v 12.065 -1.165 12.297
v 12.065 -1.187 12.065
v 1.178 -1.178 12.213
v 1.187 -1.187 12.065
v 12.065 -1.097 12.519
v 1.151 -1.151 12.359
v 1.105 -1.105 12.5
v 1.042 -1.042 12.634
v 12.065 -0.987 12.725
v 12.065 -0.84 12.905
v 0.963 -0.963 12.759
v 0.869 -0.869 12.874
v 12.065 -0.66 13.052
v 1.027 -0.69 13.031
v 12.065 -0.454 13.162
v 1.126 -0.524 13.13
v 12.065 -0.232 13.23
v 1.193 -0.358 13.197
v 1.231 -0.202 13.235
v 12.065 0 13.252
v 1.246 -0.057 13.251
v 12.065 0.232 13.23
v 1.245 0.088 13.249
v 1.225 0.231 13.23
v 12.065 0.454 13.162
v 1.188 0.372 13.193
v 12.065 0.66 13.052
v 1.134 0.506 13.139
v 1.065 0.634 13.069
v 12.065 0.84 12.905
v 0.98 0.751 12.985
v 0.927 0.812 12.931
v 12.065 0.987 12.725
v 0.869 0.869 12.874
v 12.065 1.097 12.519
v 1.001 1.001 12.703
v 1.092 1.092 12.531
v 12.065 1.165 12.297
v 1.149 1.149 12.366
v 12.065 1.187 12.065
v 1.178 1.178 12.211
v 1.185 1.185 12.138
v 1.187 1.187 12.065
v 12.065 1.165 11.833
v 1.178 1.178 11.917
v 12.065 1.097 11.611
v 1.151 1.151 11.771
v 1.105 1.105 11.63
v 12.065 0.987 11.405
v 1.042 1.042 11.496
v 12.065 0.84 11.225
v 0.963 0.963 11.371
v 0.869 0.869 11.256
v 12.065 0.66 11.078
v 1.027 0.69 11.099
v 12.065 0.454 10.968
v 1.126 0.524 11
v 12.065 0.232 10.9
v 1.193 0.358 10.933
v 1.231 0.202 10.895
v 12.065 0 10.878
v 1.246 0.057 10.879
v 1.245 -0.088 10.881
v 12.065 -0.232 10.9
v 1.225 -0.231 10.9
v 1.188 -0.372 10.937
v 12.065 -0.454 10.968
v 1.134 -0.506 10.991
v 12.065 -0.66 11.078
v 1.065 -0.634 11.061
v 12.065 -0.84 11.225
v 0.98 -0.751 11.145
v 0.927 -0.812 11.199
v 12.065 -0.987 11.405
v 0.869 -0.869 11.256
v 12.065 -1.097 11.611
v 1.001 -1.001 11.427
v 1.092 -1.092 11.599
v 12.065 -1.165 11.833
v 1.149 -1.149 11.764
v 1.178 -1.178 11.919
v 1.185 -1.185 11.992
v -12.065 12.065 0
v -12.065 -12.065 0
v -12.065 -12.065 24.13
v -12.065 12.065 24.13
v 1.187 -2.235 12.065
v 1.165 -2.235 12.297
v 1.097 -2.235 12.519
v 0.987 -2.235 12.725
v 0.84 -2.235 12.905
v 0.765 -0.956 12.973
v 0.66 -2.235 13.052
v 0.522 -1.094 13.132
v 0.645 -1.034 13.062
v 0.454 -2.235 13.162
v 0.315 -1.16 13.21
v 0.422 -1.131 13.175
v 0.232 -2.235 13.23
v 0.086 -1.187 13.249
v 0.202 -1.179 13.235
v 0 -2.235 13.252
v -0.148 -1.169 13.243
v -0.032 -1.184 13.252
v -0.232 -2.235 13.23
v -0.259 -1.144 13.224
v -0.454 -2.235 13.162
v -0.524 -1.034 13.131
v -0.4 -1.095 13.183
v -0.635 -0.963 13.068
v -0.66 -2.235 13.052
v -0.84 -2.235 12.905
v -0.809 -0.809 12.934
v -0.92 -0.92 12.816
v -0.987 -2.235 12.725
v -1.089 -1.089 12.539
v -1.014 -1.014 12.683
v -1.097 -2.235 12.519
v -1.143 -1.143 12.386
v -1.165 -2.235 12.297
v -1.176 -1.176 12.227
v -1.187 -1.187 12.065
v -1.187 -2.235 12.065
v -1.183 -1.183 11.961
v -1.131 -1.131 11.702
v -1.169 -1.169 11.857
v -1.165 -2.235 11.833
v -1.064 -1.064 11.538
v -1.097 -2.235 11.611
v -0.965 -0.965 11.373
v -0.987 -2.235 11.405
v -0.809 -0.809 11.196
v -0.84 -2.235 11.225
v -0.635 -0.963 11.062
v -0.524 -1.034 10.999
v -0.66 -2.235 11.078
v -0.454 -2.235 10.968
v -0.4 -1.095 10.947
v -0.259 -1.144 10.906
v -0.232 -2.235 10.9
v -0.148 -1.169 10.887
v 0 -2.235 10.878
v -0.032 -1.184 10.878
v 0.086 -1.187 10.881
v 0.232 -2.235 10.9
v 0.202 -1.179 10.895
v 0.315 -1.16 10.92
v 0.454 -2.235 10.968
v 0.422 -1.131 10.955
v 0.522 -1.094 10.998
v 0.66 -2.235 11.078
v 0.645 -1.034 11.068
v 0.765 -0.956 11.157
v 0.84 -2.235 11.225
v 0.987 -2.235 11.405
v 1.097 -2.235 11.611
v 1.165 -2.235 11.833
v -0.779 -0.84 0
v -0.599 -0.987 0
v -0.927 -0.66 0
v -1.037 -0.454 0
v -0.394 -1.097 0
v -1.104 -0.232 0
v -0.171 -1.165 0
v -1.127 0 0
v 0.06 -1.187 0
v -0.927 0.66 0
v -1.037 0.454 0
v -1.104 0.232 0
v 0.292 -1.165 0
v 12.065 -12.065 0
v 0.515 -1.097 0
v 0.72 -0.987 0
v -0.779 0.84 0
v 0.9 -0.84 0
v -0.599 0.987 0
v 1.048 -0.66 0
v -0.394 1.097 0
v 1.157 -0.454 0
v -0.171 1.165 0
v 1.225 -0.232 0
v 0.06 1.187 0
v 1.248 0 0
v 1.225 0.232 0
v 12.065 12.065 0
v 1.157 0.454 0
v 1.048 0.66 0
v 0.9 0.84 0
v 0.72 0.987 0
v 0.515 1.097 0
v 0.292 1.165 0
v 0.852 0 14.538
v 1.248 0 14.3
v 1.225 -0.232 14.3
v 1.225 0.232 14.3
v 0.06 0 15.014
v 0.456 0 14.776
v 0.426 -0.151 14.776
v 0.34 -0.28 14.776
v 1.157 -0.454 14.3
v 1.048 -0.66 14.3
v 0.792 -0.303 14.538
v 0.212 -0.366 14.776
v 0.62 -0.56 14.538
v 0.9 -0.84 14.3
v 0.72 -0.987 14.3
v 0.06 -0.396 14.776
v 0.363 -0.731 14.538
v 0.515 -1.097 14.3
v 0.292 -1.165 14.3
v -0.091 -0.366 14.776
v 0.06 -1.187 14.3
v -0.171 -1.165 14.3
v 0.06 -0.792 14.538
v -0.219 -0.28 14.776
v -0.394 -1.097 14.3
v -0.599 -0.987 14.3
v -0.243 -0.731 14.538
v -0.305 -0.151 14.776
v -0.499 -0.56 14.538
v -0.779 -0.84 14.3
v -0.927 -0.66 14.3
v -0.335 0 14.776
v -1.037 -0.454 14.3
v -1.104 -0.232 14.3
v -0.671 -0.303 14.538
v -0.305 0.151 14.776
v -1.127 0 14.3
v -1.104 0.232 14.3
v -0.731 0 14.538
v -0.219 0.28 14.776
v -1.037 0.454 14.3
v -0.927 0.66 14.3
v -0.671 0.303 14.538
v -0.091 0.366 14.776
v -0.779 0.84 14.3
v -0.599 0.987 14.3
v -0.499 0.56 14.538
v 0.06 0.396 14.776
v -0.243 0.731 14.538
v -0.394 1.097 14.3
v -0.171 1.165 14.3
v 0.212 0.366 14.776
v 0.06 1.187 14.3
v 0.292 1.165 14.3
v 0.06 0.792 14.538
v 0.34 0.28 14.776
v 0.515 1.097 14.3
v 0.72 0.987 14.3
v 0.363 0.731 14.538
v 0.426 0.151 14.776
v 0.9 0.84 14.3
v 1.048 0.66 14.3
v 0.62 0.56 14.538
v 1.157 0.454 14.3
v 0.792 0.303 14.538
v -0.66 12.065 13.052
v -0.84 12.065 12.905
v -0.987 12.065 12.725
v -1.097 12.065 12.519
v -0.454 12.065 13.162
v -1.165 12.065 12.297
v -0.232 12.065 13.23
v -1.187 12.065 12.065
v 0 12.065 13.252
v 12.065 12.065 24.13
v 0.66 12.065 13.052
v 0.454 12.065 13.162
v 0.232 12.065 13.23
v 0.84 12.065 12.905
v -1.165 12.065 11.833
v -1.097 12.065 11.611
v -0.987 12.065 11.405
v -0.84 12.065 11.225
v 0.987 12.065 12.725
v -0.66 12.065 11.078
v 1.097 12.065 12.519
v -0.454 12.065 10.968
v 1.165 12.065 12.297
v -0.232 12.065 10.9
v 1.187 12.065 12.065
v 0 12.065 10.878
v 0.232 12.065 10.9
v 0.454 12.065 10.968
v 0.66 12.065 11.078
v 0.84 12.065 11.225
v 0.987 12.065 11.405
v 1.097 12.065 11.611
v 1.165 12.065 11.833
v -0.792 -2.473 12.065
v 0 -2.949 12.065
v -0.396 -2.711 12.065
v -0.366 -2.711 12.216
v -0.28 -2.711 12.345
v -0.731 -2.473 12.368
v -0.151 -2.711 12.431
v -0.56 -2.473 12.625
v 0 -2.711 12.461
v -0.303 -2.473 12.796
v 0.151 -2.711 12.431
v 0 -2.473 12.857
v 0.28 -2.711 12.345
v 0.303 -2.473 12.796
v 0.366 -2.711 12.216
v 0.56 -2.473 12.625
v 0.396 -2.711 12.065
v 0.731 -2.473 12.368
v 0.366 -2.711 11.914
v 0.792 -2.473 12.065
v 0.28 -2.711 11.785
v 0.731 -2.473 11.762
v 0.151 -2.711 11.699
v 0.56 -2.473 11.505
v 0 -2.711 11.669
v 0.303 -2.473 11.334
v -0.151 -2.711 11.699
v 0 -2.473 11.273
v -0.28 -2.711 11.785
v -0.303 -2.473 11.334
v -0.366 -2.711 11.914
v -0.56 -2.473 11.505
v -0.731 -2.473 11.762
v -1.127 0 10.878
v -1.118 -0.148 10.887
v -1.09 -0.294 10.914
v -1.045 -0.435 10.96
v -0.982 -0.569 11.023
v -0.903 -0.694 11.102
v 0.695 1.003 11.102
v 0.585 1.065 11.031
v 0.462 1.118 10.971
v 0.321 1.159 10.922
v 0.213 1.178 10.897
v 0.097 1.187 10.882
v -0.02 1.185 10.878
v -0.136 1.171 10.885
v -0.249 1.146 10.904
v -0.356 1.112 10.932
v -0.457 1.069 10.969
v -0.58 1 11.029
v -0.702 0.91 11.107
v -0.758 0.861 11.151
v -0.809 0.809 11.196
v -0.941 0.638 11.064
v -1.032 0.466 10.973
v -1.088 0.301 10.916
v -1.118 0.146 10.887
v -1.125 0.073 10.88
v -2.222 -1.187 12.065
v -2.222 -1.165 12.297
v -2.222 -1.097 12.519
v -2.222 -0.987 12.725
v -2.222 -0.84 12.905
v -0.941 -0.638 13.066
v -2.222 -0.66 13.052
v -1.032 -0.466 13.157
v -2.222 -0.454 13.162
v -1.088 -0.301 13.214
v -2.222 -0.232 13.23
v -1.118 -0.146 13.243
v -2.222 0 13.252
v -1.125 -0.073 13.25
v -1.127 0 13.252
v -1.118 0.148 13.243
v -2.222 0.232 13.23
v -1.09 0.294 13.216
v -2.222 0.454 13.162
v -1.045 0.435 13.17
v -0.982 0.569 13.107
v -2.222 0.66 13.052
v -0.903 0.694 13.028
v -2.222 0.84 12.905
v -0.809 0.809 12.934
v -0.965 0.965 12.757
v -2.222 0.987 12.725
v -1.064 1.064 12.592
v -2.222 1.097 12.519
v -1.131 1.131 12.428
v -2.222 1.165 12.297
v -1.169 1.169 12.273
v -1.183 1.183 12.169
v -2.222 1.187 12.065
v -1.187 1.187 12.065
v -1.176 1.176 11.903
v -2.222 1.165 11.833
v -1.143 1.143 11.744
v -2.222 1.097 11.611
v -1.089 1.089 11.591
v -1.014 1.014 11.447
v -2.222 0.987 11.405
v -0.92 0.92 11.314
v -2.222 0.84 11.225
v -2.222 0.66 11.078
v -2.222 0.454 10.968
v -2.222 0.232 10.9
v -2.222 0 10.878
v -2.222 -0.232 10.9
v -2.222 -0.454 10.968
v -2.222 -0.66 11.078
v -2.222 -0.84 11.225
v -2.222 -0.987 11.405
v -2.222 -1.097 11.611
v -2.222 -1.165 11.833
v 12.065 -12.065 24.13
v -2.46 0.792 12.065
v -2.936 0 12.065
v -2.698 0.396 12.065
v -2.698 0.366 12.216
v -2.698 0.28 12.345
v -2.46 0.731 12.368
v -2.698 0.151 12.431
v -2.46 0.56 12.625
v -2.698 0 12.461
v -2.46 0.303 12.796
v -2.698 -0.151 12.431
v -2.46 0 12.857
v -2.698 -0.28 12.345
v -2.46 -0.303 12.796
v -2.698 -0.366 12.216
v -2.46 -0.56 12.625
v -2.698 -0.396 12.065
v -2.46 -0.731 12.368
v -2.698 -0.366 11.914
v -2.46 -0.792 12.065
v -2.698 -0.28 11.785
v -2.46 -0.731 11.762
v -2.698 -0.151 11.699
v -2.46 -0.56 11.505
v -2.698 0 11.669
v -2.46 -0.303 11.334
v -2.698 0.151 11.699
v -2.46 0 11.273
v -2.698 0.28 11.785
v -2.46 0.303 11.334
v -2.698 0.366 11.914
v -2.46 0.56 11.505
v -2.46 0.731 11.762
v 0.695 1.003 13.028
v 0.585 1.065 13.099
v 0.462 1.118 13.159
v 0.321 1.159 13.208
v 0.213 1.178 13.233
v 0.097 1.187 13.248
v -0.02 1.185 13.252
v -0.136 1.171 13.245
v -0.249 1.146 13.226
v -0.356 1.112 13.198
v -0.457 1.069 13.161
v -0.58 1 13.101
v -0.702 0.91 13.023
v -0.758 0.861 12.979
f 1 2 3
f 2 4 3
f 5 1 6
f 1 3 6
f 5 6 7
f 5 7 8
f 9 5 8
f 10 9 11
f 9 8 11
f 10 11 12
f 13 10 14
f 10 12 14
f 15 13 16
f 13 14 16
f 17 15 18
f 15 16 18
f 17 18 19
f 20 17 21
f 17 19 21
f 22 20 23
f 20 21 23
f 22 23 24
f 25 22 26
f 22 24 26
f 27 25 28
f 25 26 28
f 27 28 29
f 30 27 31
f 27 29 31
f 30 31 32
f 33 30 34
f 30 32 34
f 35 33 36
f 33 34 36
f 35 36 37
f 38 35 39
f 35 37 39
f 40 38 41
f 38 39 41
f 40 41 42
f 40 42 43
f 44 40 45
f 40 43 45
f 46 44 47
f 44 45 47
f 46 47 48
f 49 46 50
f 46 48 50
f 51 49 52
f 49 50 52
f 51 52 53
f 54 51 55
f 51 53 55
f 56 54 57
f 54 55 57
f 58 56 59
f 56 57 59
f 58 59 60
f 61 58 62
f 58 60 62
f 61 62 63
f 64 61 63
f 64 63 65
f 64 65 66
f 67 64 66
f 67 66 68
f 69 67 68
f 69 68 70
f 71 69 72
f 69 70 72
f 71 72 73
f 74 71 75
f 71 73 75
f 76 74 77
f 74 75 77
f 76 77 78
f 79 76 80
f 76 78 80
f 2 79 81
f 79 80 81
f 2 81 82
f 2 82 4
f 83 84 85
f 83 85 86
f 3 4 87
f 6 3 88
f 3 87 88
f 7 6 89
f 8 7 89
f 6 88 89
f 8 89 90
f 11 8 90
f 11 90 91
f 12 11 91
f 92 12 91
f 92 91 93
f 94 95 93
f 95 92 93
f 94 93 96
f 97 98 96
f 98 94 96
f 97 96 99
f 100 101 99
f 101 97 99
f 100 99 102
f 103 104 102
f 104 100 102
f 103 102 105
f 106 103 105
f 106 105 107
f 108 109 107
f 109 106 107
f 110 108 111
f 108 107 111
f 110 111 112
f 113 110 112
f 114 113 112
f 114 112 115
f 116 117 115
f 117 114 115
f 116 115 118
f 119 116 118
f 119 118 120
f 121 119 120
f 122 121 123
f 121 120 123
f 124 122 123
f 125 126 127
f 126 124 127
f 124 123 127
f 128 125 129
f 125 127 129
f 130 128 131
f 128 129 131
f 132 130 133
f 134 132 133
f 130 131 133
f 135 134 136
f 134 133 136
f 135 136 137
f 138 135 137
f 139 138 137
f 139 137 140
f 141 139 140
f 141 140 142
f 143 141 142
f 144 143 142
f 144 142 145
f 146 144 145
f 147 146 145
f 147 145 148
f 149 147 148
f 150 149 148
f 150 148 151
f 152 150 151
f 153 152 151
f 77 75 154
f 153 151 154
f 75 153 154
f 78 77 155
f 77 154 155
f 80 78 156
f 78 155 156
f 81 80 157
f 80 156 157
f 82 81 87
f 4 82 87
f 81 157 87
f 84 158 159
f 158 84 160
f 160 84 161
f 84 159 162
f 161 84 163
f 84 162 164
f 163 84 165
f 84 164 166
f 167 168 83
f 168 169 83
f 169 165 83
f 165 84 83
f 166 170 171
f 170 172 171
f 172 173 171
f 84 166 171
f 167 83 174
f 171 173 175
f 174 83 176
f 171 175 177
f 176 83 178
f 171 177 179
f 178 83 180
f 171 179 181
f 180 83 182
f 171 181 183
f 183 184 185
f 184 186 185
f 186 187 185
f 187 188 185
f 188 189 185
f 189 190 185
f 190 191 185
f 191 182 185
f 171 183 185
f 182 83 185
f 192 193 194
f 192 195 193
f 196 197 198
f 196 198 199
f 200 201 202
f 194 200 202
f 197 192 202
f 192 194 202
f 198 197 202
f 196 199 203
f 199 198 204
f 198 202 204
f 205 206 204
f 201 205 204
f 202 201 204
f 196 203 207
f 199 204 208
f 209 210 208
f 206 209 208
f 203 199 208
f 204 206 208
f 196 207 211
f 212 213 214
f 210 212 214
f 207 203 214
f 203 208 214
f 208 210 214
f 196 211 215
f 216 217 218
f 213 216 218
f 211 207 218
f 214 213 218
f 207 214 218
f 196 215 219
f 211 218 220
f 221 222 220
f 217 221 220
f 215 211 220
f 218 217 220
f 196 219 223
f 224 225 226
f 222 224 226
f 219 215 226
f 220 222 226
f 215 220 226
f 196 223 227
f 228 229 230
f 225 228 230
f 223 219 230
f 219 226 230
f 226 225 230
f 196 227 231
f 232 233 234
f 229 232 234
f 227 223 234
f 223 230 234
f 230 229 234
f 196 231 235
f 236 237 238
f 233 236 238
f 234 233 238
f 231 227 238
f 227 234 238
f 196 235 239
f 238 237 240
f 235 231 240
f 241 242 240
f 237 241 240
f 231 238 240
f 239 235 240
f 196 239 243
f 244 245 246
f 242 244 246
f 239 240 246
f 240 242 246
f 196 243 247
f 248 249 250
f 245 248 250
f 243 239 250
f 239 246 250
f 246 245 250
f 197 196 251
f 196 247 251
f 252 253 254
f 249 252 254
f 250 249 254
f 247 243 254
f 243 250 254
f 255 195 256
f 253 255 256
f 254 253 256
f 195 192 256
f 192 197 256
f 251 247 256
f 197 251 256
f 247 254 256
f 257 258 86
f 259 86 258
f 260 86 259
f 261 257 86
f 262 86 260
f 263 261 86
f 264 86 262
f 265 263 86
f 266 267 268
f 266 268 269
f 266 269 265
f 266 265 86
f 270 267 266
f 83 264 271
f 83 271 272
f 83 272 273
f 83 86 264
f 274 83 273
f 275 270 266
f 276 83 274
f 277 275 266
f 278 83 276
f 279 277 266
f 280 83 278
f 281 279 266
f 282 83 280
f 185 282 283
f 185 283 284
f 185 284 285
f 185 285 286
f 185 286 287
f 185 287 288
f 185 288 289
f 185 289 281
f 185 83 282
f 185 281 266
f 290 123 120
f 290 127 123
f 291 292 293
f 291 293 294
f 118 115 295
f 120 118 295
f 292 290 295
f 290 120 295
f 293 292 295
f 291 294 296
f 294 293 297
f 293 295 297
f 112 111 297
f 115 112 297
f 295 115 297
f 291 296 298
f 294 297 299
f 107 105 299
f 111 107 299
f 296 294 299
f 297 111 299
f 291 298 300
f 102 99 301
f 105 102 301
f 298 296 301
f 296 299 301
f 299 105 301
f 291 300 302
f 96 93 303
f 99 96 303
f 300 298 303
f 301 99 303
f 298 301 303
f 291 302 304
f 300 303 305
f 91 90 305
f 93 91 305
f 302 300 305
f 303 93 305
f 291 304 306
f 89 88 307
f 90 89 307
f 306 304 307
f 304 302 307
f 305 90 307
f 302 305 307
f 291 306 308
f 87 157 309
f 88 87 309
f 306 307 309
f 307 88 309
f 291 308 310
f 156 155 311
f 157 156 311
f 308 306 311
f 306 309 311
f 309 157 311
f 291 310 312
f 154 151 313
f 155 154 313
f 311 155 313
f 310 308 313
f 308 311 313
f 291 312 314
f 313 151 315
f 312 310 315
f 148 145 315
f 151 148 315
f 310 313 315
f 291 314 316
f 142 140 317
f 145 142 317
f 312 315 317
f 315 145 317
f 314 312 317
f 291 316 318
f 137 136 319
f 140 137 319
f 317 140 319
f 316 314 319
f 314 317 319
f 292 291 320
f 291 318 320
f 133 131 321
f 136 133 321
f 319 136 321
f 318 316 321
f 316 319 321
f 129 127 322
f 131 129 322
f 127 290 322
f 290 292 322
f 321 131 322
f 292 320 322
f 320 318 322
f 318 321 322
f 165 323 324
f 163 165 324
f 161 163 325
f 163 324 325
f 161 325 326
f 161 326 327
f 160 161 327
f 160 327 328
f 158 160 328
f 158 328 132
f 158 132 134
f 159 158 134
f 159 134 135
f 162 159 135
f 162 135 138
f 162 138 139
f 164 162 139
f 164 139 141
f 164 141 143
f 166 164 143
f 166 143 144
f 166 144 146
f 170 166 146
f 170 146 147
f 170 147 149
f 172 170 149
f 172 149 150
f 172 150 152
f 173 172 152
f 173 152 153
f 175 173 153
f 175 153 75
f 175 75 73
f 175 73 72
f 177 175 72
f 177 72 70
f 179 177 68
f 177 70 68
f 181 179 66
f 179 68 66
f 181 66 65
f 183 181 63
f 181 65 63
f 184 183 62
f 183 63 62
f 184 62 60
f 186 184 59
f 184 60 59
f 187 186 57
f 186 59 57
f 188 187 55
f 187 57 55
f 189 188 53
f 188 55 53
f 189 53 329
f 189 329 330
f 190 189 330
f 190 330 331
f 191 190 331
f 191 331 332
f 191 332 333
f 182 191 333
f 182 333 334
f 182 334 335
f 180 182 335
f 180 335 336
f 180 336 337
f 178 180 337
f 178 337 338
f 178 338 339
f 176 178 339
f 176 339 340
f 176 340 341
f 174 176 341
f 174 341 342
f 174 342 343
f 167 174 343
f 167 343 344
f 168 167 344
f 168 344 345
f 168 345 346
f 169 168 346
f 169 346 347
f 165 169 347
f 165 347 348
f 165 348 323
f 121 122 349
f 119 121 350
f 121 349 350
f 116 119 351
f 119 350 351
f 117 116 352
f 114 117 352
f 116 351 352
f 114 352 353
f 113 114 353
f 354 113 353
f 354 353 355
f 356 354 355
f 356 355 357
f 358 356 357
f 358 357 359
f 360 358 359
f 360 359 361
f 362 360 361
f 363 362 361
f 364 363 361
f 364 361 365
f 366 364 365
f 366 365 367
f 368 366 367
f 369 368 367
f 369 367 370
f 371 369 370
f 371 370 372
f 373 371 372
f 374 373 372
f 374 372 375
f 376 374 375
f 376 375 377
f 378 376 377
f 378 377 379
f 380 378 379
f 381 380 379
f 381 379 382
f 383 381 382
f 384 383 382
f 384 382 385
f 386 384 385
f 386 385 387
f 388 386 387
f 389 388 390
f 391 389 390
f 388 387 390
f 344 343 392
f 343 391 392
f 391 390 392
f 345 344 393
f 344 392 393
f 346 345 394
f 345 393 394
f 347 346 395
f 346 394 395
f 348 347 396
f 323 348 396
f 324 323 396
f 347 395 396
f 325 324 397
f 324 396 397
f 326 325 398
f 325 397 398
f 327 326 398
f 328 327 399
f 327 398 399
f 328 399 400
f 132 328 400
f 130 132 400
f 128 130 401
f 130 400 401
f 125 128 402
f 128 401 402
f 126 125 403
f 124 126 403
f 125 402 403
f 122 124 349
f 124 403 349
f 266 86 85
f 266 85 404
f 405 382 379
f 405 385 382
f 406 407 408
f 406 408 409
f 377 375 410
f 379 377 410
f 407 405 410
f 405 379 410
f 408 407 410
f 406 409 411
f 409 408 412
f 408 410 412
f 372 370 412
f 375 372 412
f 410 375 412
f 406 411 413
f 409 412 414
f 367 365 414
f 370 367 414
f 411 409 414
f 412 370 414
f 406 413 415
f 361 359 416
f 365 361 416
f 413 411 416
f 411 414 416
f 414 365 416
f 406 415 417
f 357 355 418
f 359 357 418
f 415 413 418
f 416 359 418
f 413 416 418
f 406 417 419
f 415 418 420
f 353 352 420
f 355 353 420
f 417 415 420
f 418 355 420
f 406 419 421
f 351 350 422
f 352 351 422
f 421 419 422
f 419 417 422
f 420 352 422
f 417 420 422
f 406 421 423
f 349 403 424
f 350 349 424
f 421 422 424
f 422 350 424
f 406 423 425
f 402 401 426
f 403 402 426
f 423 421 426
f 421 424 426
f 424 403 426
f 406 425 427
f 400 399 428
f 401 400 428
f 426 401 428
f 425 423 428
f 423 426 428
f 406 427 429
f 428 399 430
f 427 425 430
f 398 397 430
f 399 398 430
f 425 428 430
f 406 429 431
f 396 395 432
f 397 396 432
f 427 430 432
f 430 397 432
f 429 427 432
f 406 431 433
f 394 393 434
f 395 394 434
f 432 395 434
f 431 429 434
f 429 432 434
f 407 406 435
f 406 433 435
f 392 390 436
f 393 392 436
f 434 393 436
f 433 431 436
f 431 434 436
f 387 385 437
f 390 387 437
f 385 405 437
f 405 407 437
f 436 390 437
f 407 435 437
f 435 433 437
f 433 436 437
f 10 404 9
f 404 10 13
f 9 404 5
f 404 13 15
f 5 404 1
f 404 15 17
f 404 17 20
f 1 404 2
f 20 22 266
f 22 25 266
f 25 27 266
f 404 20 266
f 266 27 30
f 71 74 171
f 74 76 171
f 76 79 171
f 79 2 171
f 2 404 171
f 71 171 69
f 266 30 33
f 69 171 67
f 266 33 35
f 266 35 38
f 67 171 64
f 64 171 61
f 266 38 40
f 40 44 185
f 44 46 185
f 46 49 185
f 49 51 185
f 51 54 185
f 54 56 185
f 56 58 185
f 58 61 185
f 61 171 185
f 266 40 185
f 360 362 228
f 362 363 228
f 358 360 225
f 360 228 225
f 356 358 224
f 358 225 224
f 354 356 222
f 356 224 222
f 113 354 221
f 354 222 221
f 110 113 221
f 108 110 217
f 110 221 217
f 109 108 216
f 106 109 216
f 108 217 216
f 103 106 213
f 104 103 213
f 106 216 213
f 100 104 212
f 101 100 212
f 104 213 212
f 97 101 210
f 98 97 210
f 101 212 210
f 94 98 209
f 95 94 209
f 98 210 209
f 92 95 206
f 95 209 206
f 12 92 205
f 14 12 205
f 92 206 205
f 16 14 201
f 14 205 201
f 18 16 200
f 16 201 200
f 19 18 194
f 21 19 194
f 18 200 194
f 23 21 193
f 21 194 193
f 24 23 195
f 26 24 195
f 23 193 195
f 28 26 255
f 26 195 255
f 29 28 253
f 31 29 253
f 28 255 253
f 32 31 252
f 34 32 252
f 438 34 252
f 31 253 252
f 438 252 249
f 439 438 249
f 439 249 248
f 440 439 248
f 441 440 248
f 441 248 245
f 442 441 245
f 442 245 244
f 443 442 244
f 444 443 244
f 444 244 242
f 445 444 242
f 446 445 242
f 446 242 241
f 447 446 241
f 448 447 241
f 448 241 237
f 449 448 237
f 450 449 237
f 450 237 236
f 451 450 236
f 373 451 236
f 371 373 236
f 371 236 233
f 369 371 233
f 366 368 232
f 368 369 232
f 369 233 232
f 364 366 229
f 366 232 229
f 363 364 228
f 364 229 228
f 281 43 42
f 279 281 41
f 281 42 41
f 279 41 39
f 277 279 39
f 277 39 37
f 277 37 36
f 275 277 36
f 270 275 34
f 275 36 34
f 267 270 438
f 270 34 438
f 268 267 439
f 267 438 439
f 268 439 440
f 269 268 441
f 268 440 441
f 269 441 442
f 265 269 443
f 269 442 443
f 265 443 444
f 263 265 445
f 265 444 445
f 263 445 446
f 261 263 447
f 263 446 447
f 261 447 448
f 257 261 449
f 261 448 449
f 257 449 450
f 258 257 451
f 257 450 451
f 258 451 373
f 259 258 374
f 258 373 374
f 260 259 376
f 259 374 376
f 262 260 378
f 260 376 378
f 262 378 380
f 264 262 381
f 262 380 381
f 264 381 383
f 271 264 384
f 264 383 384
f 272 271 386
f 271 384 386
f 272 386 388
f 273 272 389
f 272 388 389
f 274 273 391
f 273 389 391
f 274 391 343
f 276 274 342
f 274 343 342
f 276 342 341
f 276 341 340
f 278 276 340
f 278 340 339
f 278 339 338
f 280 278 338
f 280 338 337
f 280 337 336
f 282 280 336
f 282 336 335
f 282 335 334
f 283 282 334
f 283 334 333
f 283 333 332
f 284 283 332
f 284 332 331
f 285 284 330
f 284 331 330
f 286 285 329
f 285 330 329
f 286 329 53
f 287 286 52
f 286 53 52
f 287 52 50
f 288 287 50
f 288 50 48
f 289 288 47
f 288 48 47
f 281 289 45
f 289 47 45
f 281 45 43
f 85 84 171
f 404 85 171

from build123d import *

# Parameters (mm, degrees)
F0_W     = 24.13
F0_H     = 24.13
F1_DEPTH = 24.13
F3_D     = 2.3749
F3_DEPTH = 14.2875
F3_TIP   = 0.7134919421
F5_D     = 2.3749
F5_DEPTH = 14.3002
F5_TIP   = 0.7134919421
F7_D     = 2.3749
F7_DEPTH = 14.3002
F7_TIP   = 0.7134919421


with BuildPart() as f1:
    # F0 (on Top) → F1 (new body)
    with BuildSketch(Plane.XY):
        Rectangle(F0_W, F0_H)
    extrude(amount=F1_DEPTH)

    # F3
    with Locations(Plane.YZ.offset(12.065)):
        with Locations((0, 12.065)):
            Hole(F3_D / 2, depth=F3_DEPTH)
            with Locations((0, 0, -(F3_DEPTH + F3_TIP / 2))):  # 118° drill point
                Cone(0, F3_D / 2, F3_TIP, mode=Mode.SUBTRACT)

    # F5
    with Locations(Plane(origin=(0, 0, 0), x_dir=(1, 0, 0), z_dir=(0, 0, -1))):
        with Locations((0.0603985645, 0)):
            Hole(F5_D / 2, depth=F5_DEPTH)
            with Locations((0, 0, -(F5_DEPTH + F5_TIP / 2))):  # 118° drill point
                Cone(0, F5_D / 2, F5_TIP, mode=Mode.SUBTRACT)

    # F7
    with Locations(Plane(origin=(0, 12.065, 0), x_dir=(-1, 0, 0), z_dir=(0, 1, 0))):
        with Locations((0, 12.065)):
            Hole(F7_D / 2, depth=F7_DEPTH)
            with Locations((0, 0, -(F7_DEPTH + F7_TIP / 2))):  # 118° drill point
                Cone(0, F7_D / 2, F7_TIP, mode=Mode.SUBTRACT)


solid = f1.part
